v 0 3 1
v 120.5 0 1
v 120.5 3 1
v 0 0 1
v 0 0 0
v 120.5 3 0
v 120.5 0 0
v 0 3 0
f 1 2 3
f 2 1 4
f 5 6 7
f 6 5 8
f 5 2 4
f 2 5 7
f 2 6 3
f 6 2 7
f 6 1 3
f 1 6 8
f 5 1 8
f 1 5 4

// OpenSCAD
// Plain numbers with no range: the Customizer shows a number box for each.
plain_length = 120.5;
plain_count = 3;

cube([plain_length, plain_count, 1]);
